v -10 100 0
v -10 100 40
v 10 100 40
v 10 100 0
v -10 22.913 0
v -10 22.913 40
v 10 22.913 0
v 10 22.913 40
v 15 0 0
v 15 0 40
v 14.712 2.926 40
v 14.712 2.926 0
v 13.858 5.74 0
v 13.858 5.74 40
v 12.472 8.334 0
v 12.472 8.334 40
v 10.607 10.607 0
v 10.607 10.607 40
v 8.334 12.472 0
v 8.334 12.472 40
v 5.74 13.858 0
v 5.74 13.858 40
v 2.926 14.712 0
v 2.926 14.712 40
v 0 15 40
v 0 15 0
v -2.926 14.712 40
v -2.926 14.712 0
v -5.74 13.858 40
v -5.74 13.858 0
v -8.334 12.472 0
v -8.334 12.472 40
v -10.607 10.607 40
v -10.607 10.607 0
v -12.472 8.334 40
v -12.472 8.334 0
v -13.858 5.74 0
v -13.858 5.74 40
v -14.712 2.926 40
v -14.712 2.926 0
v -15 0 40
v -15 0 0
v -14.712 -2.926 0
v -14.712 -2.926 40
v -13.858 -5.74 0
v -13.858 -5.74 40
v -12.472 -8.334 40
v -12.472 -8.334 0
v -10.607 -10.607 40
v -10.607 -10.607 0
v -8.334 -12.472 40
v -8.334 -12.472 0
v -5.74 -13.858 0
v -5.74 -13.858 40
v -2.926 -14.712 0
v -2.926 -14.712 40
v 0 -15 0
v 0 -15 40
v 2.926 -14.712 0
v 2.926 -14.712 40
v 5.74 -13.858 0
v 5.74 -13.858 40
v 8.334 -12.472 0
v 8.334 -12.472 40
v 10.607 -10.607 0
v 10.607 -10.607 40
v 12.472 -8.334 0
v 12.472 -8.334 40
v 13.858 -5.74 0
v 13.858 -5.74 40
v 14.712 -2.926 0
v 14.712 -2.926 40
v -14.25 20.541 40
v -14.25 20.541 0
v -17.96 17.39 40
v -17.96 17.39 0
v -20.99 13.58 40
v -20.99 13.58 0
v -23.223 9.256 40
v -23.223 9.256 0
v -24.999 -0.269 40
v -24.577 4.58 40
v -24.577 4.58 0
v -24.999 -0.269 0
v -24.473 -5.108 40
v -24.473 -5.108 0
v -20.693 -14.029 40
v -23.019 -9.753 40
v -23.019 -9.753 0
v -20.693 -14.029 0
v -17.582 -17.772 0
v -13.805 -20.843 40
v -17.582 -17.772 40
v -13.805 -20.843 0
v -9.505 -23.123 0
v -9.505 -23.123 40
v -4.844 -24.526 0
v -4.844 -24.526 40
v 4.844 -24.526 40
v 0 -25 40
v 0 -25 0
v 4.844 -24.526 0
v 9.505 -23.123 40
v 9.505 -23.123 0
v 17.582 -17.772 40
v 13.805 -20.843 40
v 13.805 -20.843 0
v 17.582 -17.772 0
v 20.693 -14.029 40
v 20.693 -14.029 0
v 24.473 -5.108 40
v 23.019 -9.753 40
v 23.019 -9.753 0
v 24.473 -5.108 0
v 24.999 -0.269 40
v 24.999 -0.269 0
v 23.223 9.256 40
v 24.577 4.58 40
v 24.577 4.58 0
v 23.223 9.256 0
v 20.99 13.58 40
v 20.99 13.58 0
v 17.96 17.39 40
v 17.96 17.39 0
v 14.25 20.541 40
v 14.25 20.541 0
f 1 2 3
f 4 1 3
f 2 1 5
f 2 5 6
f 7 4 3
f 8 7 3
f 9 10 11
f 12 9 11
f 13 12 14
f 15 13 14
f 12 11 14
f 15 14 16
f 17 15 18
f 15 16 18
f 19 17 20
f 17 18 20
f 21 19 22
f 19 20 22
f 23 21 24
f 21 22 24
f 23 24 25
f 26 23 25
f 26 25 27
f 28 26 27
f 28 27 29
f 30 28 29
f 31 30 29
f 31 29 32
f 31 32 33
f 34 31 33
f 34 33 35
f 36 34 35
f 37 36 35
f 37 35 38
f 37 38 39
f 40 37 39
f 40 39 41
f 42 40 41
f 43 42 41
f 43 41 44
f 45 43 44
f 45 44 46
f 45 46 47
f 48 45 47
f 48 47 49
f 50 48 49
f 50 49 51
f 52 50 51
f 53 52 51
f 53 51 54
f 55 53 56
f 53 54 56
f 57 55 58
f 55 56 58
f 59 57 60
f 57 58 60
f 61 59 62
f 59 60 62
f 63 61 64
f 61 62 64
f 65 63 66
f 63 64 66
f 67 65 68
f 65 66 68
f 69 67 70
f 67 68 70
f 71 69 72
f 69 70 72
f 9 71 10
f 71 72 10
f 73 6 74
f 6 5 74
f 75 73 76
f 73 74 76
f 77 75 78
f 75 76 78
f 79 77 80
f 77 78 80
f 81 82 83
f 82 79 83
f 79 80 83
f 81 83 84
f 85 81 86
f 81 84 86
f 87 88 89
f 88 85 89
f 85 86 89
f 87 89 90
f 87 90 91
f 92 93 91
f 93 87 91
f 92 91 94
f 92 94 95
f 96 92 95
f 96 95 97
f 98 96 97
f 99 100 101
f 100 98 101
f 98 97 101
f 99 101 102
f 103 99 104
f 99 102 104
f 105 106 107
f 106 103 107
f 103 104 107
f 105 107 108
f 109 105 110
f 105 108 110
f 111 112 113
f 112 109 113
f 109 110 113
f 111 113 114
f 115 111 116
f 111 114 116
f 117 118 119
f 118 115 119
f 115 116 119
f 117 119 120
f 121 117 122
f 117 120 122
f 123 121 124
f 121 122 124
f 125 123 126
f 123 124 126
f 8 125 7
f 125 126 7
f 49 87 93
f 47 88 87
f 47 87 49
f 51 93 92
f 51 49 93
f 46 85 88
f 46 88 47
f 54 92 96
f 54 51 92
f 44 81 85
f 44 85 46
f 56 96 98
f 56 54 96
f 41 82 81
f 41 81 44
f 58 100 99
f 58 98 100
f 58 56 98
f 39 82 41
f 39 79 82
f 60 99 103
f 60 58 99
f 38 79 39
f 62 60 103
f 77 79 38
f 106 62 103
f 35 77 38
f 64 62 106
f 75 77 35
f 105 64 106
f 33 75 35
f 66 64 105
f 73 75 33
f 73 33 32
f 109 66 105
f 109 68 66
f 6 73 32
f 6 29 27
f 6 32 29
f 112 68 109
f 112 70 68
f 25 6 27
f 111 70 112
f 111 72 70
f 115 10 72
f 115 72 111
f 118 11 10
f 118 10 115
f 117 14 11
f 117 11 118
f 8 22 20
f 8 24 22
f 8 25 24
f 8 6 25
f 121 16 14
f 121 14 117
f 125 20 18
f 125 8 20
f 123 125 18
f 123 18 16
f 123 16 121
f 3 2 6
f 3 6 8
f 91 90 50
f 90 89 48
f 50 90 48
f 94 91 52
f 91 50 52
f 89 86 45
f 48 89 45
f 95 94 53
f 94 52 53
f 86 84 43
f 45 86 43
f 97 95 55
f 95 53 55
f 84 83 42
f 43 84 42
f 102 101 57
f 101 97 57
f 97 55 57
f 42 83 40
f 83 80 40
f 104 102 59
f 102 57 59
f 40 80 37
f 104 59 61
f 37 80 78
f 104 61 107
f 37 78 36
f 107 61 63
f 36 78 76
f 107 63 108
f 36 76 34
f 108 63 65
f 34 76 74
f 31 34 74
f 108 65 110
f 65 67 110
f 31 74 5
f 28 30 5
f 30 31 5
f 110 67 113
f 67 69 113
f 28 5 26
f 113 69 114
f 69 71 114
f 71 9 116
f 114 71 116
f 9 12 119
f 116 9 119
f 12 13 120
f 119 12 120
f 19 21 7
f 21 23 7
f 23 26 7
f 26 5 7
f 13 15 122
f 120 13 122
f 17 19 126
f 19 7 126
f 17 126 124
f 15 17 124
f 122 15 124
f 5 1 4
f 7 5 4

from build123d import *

# Parameters (mm, degrees)
F0_R     = 25
F1_DEPTH = 40
F2_W     = 20
F2_H     = 40
F3_DEPTH = 100
F4_R     = 15
F5_DEPTH = 43


with BuildPart() as f1:
    # F0 (on Top) → F1 (new body)
    with BuildSketch(Plane.XY):
        Circle(F0_R)
    extrude(amount=F1_DEPTH)

    # F2 (on Front) → F3 (join)
    with BuildSketch(Plane.XZ):
        with Locations((0, 20)):
            Rectangle(F2_W, F2_H)
    extrude(amount=-F3_DEPTH)

    # F4 (on face) → F5 (cut)
    with BuildSketch(Plane.XY.offset(40)):
        Circle(F4_R)
    extrude(amount=-F5_DEPTH, mode=Mode.SUBTRACT)


solid = f1.part
